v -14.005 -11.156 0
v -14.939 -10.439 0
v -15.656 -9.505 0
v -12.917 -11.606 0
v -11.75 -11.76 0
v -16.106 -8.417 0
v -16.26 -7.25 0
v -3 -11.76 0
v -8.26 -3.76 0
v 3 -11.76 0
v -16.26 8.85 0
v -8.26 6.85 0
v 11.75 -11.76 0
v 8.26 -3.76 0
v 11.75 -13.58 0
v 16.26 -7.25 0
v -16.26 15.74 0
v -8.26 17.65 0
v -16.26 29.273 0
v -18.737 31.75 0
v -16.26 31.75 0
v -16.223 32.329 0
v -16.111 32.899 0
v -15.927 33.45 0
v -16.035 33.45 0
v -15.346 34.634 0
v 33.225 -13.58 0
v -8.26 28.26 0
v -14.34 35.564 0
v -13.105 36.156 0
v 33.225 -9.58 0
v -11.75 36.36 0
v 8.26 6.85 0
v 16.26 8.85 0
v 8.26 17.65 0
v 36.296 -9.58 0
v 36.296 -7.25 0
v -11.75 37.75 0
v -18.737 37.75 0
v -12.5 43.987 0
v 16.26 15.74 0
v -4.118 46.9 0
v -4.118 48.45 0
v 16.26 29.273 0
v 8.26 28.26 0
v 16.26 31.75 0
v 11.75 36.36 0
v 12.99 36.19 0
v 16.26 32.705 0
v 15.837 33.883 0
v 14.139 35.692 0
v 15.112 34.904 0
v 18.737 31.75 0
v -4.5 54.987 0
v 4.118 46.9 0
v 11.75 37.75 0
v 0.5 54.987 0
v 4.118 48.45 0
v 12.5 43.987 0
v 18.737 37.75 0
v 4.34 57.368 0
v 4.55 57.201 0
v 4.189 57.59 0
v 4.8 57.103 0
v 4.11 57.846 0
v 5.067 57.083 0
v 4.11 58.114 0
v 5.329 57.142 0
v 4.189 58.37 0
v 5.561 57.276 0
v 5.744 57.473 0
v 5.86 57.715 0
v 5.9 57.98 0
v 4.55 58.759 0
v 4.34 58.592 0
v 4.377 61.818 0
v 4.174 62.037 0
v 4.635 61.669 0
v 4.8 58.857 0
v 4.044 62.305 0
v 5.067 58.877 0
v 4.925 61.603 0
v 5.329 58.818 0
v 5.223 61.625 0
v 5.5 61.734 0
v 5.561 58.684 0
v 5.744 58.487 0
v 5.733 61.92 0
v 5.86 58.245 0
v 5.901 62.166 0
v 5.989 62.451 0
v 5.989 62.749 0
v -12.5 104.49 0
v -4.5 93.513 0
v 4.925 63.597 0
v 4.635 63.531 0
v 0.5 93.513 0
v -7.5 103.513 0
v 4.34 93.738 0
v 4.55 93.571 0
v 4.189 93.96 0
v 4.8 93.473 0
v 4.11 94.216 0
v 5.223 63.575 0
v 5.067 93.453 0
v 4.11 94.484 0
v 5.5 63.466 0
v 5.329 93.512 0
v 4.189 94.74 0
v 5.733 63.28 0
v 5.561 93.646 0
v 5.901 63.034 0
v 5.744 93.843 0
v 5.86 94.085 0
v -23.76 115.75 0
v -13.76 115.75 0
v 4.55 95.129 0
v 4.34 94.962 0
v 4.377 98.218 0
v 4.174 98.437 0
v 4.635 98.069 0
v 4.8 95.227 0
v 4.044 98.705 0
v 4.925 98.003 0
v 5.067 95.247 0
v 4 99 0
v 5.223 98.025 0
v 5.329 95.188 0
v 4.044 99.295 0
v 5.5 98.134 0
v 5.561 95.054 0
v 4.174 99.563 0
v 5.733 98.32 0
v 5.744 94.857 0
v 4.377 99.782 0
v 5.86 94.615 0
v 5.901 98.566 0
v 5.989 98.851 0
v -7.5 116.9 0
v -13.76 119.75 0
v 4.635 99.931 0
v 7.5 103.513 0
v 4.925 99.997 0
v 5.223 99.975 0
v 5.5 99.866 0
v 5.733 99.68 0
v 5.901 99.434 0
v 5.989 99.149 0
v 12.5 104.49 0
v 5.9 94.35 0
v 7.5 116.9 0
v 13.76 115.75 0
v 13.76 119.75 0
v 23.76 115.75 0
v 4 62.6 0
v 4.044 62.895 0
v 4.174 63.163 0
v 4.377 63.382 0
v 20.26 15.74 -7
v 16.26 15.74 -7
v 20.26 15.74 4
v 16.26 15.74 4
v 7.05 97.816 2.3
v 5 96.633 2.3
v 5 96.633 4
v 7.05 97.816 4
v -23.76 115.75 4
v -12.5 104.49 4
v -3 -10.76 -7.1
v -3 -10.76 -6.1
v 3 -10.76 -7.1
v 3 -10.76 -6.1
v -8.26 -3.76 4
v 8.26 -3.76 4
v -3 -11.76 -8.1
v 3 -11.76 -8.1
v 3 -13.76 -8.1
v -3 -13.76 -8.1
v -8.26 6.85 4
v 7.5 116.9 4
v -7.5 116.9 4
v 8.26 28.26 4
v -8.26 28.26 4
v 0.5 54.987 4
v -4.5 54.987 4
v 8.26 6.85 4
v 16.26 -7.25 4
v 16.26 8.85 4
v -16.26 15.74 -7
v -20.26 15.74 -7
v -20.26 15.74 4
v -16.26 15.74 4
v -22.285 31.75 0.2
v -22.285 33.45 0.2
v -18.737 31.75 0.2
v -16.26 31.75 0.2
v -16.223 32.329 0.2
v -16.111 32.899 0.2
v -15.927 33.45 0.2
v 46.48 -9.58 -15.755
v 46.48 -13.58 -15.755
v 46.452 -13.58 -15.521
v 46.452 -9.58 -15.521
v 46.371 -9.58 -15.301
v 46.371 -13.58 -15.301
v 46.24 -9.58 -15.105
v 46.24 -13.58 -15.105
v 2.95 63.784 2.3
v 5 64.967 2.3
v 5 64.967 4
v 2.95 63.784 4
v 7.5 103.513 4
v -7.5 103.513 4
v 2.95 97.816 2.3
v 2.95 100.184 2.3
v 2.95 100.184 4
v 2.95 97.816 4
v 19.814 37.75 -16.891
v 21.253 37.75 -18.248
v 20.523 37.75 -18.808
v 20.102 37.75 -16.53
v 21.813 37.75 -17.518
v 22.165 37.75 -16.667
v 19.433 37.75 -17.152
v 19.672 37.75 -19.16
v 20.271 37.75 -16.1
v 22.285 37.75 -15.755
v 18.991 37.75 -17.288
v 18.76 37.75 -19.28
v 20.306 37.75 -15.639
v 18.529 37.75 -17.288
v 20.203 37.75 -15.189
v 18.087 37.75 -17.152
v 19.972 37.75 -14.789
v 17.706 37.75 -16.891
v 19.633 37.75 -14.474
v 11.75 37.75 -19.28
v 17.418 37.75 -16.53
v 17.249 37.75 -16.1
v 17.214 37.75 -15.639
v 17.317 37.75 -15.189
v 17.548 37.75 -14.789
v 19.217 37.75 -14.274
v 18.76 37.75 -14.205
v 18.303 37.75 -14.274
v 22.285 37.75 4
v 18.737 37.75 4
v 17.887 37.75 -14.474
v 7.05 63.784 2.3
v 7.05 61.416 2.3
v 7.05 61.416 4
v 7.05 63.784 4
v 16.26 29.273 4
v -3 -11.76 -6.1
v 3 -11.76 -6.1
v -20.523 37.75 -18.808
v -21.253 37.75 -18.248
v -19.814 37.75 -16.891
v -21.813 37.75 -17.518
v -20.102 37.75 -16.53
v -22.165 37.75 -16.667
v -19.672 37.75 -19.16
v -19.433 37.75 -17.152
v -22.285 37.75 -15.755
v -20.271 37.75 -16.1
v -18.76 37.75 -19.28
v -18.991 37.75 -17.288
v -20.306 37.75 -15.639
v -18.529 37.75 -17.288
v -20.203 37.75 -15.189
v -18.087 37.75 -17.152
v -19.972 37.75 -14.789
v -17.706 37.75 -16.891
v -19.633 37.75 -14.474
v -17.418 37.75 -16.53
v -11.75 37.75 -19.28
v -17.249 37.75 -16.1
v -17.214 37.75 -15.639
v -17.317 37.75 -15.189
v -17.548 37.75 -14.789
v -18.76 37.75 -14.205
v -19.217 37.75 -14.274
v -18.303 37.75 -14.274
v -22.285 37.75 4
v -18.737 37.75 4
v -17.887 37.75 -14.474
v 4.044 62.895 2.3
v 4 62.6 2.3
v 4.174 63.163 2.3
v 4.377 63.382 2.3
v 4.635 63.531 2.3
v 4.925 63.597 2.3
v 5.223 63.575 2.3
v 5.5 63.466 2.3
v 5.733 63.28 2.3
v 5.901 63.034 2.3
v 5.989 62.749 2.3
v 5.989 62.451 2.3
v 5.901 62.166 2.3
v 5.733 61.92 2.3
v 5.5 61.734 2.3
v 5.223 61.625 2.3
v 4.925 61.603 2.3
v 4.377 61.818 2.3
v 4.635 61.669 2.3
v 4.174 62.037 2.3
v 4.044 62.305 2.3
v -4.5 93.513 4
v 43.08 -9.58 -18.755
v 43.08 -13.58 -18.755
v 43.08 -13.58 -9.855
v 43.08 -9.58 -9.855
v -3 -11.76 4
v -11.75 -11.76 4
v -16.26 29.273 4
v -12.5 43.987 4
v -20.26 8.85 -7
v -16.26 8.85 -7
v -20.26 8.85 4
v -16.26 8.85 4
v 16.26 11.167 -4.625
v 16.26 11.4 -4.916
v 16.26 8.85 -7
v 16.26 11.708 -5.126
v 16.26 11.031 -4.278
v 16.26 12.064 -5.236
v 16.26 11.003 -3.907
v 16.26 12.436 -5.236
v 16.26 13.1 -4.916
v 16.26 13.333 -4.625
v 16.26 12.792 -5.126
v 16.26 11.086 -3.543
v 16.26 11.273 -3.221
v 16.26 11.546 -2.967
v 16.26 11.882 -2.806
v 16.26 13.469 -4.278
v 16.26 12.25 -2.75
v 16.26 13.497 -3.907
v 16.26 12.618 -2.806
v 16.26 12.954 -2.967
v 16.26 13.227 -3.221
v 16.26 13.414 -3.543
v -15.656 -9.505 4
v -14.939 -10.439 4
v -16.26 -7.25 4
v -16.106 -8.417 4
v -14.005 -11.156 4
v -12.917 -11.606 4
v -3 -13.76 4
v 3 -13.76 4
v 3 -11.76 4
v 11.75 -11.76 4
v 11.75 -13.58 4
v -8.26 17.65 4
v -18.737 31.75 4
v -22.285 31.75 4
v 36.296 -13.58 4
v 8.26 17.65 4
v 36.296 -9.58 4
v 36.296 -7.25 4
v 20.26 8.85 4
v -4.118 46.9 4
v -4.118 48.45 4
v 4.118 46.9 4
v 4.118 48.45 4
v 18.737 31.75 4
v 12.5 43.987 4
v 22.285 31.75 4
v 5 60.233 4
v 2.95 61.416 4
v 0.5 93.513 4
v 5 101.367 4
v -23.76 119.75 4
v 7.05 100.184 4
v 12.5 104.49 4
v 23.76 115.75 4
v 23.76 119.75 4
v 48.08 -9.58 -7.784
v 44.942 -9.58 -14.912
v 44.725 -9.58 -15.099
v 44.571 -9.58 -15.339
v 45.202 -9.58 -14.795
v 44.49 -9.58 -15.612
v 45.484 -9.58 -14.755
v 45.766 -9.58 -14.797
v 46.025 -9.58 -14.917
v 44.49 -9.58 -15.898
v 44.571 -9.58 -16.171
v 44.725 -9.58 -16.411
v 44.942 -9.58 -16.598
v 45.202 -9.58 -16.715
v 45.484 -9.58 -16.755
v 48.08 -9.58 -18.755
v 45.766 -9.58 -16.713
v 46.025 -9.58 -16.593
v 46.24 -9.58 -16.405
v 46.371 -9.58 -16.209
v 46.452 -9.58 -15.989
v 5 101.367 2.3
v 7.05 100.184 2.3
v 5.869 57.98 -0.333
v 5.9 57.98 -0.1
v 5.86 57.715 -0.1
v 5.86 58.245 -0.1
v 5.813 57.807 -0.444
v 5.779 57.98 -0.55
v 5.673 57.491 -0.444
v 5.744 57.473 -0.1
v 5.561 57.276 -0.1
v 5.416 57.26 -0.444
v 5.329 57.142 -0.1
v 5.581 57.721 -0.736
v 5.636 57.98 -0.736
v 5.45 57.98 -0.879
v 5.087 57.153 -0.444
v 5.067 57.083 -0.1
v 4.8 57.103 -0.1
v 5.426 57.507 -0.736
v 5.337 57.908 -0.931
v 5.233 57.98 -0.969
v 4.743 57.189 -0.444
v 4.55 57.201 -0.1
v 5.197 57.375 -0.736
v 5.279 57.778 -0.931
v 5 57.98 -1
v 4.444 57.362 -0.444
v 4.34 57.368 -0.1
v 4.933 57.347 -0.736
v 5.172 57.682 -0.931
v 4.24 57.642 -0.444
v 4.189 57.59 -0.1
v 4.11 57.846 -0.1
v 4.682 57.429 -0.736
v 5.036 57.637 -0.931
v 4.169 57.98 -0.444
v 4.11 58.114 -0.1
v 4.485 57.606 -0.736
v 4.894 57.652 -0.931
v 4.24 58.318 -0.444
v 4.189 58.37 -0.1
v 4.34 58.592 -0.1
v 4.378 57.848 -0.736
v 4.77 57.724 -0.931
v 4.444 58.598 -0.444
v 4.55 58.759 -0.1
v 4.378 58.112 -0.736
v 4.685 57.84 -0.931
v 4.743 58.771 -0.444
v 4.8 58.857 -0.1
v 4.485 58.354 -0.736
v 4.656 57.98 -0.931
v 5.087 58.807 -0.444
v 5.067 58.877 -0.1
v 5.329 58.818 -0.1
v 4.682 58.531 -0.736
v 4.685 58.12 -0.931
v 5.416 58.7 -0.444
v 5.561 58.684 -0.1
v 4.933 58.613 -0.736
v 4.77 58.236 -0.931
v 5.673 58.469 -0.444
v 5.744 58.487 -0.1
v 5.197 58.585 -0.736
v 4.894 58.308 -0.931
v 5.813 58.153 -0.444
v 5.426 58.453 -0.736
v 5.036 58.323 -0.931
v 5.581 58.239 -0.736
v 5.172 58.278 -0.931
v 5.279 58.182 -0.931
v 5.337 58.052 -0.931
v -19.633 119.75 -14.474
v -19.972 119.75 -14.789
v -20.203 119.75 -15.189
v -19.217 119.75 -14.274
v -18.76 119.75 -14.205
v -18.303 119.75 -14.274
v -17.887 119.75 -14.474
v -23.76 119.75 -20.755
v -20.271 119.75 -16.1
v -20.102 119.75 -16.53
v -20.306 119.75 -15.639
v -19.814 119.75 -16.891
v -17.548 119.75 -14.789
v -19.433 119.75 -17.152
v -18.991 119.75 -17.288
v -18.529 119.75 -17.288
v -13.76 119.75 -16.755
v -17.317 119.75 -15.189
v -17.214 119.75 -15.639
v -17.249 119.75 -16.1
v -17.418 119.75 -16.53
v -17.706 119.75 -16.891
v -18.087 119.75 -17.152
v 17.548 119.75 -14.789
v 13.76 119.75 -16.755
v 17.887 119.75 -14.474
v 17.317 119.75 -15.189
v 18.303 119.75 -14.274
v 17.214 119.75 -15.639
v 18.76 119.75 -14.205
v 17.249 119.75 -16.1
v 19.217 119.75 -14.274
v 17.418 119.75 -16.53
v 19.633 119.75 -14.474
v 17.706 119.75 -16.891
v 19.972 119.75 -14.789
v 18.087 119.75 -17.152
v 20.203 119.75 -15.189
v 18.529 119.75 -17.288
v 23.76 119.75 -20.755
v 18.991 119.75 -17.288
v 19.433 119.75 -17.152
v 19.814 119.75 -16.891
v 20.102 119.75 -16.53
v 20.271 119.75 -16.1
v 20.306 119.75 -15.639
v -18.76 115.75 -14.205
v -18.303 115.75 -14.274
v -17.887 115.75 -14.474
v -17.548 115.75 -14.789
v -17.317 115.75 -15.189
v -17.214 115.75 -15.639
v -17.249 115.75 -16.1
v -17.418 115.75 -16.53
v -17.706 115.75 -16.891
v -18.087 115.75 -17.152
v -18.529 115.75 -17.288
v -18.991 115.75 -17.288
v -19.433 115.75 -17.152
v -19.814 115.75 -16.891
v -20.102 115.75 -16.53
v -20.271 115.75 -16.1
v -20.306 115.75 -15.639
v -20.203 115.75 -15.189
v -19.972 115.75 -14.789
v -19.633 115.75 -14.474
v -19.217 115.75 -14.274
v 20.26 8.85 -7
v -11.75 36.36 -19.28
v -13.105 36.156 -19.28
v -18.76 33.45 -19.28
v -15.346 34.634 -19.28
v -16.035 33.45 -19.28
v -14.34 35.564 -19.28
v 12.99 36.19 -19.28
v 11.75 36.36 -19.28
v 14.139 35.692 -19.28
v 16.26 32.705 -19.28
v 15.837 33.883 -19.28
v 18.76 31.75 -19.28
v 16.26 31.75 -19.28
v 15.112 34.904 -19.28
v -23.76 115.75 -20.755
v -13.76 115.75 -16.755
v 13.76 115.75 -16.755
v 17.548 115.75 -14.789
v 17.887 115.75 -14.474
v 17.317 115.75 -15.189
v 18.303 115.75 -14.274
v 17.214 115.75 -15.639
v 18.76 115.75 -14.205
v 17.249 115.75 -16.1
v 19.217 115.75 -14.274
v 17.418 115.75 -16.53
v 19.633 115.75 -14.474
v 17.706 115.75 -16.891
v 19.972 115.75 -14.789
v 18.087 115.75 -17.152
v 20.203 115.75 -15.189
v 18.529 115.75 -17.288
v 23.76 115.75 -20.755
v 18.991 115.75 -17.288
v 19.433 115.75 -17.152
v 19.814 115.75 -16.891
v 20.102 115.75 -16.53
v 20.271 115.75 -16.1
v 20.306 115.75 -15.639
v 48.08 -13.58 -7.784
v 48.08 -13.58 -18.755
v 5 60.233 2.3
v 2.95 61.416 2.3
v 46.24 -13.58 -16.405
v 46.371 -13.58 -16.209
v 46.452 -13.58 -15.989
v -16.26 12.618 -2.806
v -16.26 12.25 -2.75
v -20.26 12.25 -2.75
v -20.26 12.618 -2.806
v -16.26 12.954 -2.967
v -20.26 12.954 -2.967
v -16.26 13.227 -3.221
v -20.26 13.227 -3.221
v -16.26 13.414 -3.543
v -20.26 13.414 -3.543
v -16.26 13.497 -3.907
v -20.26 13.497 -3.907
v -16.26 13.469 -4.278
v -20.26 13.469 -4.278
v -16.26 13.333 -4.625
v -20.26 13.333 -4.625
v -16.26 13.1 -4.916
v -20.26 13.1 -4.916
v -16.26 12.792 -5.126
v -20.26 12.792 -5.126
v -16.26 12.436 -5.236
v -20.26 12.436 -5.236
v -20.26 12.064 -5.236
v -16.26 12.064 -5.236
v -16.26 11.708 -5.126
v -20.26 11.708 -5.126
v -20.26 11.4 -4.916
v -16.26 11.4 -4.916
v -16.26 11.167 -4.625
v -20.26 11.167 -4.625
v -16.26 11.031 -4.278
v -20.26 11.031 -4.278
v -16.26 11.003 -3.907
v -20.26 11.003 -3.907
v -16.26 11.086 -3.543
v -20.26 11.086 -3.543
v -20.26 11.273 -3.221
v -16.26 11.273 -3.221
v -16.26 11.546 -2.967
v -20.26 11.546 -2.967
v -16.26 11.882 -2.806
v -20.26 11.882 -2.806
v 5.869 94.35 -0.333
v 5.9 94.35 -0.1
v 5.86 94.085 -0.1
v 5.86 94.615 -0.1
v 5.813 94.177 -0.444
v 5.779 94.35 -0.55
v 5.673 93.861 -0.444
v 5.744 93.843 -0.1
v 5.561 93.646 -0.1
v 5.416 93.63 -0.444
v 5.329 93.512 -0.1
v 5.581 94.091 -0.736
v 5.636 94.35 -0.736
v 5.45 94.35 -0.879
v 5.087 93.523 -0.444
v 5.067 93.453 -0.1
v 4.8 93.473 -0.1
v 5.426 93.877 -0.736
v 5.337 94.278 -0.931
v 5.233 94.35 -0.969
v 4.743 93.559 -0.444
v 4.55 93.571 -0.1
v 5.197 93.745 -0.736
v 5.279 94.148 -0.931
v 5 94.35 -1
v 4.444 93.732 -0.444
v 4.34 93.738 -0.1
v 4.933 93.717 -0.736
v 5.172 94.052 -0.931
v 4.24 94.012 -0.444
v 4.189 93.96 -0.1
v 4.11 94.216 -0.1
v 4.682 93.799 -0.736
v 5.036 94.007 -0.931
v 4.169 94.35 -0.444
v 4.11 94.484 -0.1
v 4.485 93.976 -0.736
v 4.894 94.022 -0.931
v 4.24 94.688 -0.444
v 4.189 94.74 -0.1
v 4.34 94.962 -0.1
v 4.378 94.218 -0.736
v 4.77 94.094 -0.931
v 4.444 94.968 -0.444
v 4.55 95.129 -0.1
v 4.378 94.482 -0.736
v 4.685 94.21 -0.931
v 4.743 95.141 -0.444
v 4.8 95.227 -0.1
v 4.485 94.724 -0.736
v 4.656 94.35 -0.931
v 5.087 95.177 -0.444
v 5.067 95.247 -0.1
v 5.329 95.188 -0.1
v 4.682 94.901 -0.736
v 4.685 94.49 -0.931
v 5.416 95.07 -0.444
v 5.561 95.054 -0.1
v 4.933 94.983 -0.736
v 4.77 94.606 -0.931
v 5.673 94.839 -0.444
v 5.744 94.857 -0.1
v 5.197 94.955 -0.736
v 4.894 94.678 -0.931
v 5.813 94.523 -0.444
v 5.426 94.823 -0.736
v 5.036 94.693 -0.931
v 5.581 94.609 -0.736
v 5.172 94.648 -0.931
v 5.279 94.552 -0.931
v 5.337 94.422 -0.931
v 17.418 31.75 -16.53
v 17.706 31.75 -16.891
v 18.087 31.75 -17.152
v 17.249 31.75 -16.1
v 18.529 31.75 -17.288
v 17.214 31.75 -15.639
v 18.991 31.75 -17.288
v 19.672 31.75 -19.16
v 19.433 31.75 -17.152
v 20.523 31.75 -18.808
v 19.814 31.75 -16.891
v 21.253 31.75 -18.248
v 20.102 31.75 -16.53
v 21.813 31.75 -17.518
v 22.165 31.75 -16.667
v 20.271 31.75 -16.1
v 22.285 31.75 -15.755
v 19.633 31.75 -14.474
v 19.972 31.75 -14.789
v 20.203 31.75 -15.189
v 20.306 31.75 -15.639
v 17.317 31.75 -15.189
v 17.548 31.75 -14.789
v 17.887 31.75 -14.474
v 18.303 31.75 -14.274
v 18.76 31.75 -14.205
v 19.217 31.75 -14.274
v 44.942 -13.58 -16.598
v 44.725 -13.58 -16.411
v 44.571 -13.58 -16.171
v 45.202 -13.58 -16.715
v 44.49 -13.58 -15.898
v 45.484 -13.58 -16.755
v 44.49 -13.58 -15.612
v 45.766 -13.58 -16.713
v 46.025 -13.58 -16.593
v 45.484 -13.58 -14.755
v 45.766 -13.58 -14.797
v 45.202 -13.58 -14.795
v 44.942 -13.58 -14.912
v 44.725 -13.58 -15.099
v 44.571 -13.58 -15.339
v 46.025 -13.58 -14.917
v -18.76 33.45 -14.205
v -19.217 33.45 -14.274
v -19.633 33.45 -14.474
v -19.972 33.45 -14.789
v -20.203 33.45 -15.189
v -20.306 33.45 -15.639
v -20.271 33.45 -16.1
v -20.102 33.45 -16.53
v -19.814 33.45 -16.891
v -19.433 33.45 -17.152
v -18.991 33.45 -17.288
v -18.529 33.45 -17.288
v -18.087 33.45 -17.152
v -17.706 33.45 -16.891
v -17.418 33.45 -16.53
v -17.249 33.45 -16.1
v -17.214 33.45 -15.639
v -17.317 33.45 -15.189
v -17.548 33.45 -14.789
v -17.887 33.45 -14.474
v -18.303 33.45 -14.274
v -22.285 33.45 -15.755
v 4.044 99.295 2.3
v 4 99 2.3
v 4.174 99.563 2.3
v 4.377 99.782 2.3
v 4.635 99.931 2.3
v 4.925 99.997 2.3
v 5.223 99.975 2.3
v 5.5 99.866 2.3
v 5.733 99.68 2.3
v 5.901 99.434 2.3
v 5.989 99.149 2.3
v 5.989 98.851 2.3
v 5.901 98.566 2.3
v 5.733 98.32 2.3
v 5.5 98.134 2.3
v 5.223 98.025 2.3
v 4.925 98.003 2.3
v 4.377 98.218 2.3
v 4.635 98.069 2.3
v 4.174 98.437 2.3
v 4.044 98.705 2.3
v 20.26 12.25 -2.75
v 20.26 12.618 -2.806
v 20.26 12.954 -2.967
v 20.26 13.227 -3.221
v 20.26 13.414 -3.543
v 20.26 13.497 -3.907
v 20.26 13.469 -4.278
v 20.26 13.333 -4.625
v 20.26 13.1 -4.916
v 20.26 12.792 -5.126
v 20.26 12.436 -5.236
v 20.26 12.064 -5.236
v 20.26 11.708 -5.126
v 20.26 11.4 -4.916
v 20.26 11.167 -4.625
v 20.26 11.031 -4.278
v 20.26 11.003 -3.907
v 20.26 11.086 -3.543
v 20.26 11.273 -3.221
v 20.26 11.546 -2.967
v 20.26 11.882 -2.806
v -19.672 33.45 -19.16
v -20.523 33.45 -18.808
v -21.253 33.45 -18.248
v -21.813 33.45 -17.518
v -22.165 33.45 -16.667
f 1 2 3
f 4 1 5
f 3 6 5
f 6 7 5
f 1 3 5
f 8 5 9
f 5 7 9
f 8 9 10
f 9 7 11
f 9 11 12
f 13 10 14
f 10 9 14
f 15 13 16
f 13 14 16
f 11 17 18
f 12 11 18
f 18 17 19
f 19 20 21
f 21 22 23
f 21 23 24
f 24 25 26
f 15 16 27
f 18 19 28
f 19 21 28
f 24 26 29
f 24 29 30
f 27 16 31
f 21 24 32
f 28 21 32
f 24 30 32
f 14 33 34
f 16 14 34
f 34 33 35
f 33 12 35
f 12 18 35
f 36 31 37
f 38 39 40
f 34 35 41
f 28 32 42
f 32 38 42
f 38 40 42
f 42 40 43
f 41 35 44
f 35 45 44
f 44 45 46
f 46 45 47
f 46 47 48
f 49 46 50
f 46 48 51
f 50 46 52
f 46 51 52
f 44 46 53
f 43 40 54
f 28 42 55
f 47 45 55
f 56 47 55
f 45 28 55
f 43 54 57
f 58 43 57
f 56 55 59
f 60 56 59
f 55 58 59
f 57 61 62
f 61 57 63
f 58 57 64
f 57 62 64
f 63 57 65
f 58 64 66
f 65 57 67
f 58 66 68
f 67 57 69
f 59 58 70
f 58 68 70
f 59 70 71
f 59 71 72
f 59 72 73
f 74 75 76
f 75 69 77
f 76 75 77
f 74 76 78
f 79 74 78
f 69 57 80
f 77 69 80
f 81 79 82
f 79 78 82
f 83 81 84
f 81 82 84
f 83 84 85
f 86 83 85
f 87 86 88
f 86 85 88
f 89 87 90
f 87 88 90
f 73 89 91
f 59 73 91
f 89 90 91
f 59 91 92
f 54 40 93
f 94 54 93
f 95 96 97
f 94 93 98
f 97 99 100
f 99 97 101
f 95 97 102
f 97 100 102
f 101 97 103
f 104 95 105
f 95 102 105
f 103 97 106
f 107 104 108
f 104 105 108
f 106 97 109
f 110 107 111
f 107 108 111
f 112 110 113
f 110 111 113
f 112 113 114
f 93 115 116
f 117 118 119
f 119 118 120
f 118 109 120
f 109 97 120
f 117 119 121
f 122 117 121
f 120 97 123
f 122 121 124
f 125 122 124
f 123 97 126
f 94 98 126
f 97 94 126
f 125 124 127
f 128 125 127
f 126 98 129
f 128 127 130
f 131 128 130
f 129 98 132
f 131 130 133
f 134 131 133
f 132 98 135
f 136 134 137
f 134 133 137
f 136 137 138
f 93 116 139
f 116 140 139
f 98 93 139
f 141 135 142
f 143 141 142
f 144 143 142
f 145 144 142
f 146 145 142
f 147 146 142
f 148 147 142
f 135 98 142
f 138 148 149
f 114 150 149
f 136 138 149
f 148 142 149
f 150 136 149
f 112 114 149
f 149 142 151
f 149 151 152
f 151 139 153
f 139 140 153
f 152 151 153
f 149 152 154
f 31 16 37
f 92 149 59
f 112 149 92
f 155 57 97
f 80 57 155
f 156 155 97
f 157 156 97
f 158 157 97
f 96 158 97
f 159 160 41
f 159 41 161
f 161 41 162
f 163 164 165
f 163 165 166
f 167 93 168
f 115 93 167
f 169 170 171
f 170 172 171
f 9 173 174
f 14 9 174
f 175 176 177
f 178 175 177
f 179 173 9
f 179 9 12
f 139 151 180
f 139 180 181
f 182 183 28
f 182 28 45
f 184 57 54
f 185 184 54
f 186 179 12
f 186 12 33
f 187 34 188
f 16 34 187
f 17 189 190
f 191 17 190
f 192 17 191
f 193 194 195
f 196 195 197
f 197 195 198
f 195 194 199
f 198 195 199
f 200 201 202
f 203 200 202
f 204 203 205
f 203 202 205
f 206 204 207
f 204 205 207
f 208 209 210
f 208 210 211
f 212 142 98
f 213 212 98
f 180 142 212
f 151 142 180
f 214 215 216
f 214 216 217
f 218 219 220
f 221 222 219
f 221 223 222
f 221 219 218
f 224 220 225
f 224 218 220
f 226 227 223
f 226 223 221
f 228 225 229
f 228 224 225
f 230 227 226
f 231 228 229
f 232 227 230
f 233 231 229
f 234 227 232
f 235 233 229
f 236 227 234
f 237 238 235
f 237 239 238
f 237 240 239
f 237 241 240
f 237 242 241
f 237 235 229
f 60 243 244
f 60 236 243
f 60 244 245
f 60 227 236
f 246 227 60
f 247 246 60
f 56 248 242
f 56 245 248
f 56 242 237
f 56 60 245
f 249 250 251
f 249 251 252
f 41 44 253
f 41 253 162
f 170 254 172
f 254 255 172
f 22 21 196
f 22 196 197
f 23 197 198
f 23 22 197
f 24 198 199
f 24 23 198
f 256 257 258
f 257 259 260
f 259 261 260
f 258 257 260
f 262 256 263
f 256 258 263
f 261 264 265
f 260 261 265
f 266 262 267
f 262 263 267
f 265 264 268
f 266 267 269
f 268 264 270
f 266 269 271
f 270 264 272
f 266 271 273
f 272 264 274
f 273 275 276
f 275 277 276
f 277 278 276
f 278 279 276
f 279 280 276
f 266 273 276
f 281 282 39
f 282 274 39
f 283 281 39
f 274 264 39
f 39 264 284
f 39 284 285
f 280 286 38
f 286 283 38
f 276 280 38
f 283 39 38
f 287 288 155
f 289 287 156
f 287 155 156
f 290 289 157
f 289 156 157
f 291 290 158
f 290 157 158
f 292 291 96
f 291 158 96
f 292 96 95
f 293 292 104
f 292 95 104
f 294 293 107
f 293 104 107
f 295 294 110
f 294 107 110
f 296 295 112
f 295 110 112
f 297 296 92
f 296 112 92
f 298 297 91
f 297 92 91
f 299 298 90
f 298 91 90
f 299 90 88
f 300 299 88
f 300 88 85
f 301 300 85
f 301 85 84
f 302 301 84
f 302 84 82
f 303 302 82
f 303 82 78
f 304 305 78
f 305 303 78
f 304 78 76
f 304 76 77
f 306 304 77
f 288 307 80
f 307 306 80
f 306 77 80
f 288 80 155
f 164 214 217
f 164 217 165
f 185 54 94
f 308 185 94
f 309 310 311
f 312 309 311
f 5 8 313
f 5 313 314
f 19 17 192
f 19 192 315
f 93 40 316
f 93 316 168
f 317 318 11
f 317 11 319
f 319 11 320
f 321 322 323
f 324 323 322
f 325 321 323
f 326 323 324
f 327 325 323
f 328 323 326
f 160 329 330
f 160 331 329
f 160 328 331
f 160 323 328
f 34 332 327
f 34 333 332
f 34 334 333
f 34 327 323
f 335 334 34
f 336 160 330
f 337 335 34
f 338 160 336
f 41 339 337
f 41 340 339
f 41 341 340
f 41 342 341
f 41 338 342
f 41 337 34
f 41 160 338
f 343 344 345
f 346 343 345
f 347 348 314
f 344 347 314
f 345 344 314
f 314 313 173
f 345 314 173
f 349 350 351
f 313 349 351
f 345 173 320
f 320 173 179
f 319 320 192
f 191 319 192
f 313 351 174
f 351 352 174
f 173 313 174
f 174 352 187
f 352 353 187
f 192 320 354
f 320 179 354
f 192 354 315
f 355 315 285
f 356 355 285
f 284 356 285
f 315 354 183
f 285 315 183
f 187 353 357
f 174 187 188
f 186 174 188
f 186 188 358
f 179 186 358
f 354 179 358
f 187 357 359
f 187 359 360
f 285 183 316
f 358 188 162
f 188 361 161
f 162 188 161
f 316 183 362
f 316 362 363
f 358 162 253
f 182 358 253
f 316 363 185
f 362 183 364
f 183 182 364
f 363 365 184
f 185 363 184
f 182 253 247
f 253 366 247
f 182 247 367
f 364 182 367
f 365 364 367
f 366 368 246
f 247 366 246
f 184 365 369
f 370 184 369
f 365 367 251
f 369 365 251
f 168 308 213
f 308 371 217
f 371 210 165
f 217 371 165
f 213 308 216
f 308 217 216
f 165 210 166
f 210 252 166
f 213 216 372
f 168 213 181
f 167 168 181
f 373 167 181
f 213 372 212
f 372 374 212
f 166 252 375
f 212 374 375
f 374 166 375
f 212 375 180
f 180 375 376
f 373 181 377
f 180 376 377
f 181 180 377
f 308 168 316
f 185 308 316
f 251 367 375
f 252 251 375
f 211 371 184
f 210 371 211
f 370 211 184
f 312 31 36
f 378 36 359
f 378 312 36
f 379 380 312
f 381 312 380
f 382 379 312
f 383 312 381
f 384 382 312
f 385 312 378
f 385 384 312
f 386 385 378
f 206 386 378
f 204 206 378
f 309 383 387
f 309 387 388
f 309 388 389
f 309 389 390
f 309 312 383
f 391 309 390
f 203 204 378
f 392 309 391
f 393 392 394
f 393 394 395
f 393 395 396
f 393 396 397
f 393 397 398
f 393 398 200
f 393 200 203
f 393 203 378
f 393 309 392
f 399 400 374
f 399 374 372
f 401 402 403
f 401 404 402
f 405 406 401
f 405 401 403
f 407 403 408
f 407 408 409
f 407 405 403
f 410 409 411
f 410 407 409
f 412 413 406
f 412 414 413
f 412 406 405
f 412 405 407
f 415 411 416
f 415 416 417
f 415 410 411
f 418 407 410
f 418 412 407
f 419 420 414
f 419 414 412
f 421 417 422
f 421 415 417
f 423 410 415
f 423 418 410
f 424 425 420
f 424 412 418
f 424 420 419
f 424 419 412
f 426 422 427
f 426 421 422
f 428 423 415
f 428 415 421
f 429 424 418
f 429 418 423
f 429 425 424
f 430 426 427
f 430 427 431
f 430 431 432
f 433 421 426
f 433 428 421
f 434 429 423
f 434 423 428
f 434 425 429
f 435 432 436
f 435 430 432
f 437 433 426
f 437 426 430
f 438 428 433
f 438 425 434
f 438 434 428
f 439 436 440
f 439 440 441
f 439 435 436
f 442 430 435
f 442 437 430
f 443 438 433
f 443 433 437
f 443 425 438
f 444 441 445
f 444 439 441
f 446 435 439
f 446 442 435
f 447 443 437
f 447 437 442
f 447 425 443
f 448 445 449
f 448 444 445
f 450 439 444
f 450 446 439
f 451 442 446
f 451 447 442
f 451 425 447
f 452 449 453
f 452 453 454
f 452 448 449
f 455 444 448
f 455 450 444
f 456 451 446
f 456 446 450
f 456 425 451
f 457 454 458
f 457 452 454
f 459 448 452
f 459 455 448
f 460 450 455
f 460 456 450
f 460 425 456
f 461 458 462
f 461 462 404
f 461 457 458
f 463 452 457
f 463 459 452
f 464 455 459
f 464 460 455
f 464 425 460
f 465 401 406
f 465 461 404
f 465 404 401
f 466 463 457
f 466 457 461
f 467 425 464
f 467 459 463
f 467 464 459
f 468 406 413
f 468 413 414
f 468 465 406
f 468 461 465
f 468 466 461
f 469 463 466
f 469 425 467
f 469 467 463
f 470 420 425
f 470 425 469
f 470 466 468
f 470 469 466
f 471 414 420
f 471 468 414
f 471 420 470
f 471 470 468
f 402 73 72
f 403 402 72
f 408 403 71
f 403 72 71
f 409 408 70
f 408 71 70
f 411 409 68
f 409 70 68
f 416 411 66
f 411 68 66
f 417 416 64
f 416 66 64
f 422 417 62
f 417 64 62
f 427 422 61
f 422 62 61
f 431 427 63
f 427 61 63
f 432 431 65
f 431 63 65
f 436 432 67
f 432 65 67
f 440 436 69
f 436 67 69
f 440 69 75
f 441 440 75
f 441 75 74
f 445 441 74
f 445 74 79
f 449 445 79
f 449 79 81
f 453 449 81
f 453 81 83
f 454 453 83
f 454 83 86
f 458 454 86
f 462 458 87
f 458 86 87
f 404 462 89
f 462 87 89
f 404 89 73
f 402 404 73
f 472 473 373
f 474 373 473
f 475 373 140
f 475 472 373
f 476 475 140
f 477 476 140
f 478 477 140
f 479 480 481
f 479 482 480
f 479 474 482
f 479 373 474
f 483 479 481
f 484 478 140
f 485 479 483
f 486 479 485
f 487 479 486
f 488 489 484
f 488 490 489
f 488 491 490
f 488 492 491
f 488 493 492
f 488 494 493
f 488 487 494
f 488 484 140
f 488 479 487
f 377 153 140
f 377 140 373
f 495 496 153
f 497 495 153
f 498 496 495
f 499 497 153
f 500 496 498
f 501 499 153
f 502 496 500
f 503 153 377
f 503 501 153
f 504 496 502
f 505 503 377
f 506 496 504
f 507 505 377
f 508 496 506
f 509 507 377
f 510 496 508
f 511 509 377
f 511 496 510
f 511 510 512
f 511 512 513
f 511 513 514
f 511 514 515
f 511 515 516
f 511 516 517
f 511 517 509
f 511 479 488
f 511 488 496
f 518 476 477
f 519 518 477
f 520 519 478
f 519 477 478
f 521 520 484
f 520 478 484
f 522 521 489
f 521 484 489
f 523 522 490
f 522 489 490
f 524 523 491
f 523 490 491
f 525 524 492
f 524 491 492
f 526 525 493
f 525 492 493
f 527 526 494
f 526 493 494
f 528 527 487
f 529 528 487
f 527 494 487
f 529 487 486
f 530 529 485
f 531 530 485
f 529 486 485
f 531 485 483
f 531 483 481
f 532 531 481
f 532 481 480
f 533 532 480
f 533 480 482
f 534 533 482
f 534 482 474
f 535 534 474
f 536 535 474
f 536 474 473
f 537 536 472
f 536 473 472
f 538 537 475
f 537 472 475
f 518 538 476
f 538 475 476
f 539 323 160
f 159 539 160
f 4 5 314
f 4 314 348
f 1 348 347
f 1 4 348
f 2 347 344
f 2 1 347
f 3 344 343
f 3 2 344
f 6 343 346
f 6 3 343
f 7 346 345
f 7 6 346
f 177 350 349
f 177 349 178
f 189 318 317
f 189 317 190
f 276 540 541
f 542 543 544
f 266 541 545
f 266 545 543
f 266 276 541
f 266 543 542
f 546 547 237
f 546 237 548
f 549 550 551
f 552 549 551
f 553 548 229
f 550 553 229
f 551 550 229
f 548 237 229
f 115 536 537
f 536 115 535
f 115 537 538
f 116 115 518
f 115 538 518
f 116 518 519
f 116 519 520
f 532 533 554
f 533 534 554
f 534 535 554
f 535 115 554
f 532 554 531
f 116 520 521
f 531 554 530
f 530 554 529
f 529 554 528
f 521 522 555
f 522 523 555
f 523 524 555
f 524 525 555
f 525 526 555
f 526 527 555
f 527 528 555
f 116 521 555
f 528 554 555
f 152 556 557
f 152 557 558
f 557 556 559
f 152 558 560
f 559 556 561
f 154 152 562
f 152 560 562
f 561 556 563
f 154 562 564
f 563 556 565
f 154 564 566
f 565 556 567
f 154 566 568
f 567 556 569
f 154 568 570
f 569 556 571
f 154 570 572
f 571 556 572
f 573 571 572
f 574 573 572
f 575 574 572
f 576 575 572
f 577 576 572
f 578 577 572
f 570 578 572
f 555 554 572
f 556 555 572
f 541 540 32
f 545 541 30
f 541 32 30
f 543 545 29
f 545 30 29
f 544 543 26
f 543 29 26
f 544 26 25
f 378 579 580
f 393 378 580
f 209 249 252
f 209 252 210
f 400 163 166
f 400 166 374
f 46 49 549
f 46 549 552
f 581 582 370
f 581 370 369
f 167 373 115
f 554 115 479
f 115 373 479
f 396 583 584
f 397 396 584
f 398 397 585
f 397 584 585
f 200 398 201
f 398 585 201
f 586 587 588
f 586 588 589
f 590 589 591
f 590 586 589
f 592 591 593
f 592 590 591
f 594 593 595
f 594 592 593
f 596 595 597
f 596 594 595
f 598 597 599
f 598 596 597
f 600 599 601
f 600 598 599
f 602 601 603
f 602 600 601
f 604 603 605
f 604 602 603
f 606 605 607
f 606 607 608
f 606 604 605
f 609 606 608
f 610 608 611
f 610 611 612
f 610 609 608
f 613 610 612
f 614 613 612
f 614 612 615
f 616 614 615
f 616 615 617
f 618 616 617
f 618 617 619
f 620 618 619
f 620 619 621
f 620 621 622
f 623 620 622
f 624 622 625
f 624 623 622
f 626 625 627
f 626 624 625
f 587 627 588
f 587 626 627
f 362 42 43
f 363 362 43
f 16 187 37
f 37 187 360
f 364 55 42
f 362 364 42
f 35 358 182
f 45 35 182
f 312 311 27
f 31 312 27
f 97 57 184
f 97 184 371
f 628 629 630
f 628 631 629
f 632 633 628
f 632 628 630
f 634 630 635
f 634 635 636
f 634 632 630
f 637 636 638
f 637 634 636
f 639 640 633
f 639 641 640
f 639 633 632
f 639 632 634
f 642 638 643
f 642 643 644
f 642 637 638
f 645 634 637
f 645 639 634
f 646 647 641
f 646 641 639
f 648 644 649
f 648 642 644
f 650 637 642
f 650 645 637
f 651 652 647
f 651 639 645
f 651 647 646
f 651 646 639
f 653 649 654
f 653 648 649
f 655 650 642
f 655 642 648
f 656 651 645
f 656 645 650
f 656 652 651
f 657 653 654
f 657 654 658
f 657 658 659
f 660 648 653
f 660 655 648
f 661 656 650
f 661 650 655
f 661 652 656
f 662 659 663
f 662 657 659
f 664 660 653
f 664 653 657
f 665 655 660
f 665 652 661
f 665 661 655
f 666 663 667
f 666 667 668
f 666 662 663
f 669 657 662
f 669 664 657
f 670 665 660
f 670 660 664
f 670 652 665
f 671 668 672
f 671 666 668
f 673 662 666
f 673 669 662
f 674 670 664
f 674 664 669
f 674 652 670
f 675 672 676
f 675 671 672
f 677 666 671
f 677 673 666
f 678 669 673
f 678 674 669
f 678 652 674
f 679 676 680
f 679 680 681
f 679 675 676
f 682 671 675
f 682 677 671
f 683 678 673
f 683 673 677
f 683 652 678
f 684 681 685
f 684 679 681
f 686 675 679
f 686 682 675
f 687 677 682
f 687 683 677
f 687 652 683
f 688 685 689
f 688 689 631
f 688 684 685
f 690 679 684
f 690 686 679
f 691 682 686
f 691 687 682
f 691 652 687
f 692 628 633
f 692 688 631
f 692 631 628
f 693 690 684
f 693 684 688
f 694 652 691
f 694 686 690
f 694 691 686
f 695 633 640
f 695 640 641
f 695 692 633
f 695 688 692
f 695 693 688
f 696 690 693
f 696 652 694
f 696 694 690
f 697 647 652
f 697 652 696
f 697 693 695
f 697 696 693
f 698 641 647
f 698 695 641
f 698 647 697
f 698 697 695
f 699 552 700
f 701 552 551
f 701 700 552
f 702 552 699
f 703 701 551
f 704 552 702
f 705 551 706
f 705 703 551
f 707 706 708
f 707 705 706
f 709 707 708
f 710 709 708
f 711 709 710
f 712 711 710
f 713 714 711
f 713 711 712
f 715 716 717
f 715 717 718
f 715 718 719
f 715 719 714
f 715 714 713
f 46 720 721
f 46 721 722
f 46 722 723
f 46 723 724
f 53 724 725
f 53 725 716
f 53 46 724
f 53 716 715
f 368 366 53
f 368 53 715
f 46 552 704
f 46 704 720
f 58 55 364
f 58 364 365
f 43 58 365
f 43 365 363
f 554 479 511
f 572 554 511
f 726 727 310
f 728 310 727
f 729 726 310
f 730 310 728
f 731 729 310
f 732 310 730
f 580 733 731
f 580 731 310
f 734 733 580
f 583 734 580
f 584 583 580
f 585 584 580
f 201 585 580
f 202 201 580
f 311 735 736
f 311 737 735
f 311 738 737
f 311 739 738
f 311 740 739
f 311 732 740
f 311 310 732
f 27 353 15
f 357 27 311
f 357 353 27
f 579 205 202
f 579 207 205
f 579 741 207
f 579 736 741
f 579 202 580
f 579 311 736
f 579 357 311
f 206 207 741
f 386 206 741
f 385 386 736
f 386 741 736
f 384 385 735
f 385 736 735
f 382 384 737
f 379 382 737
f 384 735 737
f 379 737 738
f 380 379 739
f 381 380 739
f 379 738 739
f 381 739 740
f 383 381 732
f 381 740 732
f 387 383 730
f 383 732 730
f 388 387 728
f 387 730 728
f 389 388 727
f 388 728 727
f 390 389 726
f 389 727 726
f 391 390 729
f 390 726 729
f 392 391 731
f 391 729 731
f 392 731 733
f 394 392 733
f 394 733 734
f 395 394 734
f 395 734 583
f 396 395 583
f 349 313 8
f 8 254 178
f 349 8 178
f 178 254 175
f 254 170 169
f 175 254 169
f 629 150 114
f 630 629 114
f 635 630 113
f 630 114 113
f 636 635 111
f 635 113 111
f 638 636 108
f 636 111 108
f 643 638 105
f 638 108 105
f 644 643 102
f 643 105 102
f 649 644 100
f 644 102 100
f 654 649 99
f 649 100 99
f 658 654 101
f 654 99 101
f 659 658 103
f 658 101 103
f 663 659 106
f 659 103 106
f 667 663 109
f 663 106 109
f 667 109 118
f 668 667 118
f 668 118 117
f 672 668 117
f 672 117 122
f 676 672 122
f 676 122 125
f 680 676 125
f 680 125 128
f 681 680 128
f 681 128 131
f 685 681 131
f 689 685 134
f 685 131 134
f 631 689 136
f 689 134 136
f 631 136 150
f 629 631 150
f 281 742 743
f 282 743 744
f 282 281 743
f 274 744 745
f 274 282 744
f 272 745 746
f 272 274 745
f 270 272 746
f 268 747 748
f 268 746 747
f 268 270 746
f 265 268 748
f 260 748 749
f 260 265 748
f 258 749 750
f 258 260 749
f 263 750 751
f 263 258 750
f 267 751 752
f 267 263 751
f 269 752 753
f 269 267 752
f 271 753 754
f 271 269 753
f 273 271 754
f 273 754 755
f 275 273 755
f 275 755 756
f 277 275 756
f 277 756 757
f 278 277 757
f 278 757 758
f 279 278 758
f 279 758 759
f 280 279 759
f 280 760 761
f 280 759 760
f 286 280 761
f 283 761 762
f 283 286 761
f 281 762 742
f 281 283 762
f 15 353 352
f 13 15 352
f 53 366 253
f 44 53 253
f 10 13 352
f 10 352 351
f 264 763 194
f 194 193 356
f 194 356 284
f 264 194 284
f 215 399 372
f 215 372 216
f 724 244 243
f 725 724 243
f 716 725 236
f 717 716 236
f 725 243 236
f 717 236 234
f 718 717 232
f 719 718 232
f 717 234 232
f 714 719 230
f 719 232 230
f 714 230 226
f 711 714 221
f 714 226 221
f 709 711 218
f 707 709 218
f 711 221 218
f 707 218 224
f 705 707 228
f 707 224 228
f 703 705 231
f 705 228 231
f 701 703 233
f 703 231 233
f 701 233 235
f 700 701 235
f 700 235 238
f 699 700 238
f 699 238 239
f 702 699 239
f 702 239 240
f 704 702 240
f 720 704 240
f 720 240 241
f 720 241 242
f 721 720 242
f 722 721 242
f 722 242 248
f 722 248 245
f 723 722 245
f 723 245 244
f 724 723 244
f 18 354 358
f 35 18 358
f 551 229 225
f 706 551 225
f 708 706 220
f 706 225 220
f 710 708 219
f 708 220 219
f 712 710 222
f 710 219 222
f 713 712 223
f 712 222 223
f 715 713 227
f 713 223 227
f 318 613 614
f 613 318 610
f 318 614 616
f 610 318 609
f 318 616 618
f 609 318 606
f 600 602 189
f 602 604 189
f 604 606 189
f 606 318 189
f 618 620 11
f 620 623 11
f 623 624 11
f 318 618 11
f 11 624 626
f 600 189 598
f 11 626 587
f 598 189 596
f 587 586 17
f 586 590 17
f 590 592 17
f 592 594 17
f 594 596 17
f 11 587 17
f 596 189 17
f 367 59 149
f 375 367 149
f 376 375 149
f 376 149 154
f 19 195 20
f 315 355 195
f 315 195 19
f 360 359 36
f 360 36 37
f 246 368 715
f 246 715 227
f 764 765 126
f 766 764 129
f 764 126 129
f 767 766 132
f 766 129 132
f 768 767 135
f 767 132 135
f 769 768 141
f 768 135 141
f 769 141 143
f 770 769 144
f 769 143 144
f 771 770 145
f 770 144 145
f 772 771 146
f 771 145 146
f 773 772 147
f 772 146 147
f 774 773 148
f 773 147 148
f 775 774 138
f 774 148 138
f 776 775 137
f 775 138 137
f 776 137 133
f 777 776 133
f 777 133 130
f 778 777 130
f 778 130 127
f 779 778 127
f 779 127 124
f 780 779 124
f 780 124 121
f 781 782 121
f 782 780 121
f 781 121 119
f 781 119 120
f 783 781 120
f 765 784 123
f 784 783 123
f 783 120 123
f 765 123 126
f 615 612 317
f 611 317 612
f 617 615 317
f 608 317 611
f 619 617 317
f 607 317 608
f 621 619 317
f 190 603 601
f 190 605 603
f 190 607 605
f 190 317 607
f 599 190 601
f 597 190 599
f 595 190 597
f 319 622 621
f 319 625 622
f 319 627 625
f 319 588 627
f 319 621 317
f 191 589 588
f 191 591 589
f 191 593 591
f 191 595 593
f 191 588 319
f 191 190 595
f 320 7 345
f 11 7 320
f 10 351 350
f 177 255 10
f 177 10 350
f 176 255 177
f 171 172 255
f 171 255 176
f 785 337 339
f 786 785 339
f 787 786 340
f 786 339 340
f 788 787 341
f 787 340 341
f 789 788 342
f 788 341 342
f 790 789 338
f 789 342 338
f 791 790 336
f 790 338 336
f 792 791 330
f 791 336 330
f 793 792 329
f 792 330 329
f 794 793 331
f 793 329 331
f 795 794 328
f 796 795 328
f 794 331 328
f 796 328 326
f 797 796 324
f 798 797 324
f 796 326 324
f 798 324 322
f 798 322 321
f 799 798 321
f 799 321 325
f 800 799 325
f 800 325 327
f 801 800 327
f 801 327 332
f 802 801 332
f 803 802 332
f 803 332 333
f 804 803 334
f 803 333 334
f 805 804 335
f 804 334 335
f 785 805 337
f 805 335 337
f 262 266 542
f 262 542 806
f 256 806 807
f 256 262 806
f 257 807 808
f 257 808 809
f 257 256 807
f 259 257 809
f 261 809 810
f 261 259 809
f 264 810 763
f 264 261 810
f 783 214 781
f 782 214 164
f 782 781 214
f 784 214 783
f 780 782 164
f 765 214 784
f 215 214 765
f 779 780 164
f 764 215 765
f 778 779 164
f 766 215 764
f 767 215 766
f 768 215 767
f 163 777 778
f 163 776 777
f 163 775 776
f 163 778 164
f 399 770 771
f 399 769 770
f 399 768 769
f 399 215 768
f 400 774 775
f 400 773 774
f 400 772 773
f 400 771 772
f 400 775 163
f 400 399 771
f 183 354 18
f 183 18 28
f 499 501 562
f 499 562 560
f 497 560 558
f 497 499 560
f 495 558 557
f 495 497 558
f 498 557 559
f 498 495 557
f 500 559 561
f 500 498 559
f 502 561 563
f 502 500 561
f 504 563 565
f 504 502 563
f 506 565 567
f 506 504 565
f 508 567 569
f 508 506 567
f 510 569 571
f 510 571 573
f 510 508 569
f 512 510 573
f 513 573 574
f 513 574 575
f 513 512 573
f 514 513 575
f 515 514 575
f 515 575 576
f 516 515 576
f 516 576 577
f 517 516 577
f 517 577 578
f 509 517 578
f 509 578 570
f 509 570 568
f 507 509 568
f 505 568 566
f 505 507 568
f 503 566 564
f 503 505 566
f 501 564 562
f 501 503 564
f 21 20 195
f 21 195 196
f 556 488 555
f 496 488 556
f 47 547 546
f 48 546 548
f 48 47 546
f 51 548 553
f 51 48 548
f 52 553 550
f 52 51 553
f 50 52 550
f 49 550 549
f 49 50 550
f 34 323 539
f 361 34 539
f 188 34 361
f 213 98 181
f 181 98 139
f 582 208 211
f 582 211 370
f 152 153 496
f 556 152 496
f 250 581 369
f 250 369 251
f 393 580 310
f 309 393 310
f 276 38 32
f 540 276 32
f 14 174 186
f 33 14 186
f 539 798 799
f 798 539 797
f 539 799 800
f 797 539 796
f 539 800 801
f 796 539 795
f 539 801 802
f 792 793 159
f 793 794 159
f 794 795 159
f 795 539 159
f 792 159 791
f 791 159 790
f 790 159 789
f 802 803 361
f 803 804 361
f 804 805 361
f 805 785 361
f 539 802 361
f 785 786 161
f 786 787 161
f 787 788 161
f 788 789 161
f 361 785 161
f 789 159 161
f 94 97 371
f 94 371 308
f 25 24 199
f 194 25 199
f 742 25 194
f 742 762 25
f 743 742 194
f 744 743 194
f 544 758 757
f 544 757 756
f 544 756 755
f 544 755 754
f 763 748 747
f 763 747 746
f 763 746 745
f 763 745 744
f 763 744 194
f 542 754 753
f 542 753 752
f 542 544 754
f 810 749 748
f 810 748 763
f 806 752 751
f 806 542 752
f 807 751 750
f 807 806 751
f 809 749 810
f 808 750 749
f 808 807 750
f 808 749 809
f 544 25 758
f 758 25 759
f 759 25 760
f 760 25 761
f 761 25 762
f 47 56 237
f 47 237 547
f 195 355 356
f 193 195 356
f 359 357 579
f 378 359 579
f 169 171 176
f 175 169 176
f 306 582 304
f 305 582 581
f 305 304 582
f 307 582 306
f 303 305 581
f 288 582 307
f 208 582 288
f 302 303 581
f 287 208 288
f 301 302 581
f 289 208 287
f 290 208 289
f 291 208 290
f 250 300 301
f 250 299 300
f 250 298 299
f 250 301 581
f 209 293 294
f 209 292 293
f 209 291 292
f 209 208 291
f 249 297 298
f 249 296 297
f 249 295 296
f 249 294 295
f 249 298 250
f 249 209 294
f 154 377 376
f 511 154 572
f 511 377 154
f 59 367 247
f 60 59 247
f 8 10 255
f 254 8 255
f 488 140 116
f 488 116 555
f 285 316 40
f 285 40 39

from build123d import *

# Parameters (mm, degrees)
EXTRUDE_1_DEPTH     = 4
SKETCH_2_W          = 15
SKETCH_2_H          = 13.3866
CUT_EXTRUDE_1_DEPTH = 121.91505324
SKETCH_3_W          = 10
SKETCH_3_H          = 10
SKETCH_3_R          = 1.55
SKETCH_3_H_2        = 14.755
EXTRUDE_2_DEPTH     = 4
EXTRUDE_3_DEPTH     = 4
EXTRUDE_4_DEPTH     = 4
SKETCH_7_W          = 27.52
SKETCH_7_H          = 4
EXTRUDE_5_DEPTH     = 4
SKETCH_8_W          = 24.546067812
SKETCH_8_H          = 6.33
EXTRUDE_6_DEPTH     = 4
SKETCH_11_W         = 16.52
SKETCH_11_H         = 10.61
CUT_EXTRUDE_2_DEPTH = 132.394668556
SKETCH_12_W         = 11
SKETCH_12_H         = 6.89
SKETCH_12_R         = 1.25
EXTRUDE_6711_DEPTH  = 4
SKETCH_14_R         = 1
CUT_EXTRUDE_3_DEPTH = 131.700110654
SKETCH_15_R         = 0.9
EXTRUDE_9_DEPTH     = 1
FILLET_1_R          = 0.9
CUT_EXTRUDE_START   = -1.7
SKETCH_16_R         = 1
CUT_EXTRUDE_4_DEPTH = 1.7
CUT_EXTRUDE_5_DEPTH = 131.700110654
SKETCH_19_W         = 5
SKETCH_19_H         = 38.5268
SKETCH_19_W_2       = 8.236887868
SKETCH_19_H_2       = 1.55
CUT_EXTRUDE_6_DEPTH = 131.700110654
EXTRUDE_12_DEPTH    = 23.28
CUT_EXTRUDE_7_REACH = 99.296
SKETCH_23_R         = 1.55
EXTRUDE_13_DEPTH    = 4
CUT_EXTRUDE_START_2 = -19.28
CUT_EXTRUDE_8_DEPTH = 19.48
SKETCH_26_W         = 10.1
SKETCH_26_H         = 2
EXTRUDE_14_DEPTH    = 3


# Read off the part's stored shape, not the designer's step: 切除-拉伸8
with BuildPart() as part:
    # 草图1 → 凸台-拉伸1 (new body)
    with BuildSketch(Plane.XY):
        with BuildLine():
            Line((-16.26, -7.25), (-16.26, 119.75))
            Line((-16.26, 119.75), (16.26, 119.75))
            Line((16.26, 119.75), (16.26, -7.25))
            ThreePointArc((16.26, -7.25), (14.939051583, -10.439051583), (11.75, -11.76))
            Line((11.75, -11.76), (-11.75, -11.76))
            ThreePointArc((-11.75, -11.76), (-14.939051583, -10.439051583), (-16.26, -7.25))
        make_face()
    extrude(amount=EXTRUDE_1_DEPTH)

    # 草图2 → 切除-拉伸1 (cut, through all)
    with BuildSketch(Plane(origin=(0, 0, 0), x_dir=(-1, 0, 0), z_dir=(0, 0, -1))):
        with Locations((0, 110.2067)):
            Rectangle(SKETCH_2_W, SKETCH_2_H)
    extrude(amount=-CUT_EXTRUDE_1_DEPTH, mode=Mode.SUBTRACT)

    # 草图3 → 凸台-拉伸2 (add)
    # profile 1 of 2: a face of its own
    with BuildSketch(Plane(origin=(0, 119.75, 0), x_dir=(1, 0, 0), z_dir=(0, 1, 0))):
        with Locations((-18.76, 15.755)):
            Rectangle(SKETCH_3_W, SKETCH_3_H)
        with Locations(Location((-18.76, 15.755, 0), (0, 0, 270))):
            Circle(SKETCH_3_R, mode=Mode.SUBTRACT)
    # profile 2 of 2: a face of its own
    with BuildSketch(Plane(origin=(0, 119.75, 0), x_dir=(1, 0, 0), z_dir=(0, 1, 0))):
        with Locations((-18.76, 3.3775)):
            Rectangle(SKETCH_3_W, SKETCH_3_H_2)
    extrude_2 = extrude(amount=-EXTRUDE_2_DEPTH)

    # 镜向1: 凸台-拉伸2 across plane
    add(extrude_2.mirror(Plane(origin=(0, 0, 0), x_dir=(0, 0, 1), z_dir=(1, 0, 0))))

    # 草图6 → 凸台-拉伸4 (add)
    with BuildSketch(Plane.XY.offset(4)):
        Polygon((-16.26, 115.75), (-23.76, 115.75), (-16.26, 108.25), align=None)
        Polygon((16.26, 115.75), (16.26, 108.25), (23.76, 115.75), align=None)
    extrude(amount=-EXTRUDE_4_DEPTH)

    # 草图7 → 凸台-拉伸5 (add)
    with BuildSketch(Plane(origin=(0, 119.75, 0), x_dir=(1, 0, 0), z_dir=(0, 1, 0))):
        with Locations((0, 18.755)):
            Rectangle(SKETCH_7_W, SKETCH_7_H)
    extrude(amount=-EXTRUDE_5_DEPTH)



with BuildPart() as body_2:
    # 草图5 → 凸台-拉伸3 (new body)
    with BuildSketch(Plane(origin=(0, -13.58, 0), x_dir=(1, 0, 0), z_dir=(0, 1, 0))):
        Polygon((47.78, 9.855), (43.08, 9.855), (29.225, -4), (36.296067812, -4), (48.08, 7.783932188), (48.08, 9.855), align=None)
        with BuildLine():
            Line((47.78, 18.755), (43.08, 18.755))
            Line((43.08, 18.755), (43.08, 9.855))
            Line((43.08, 9.855), (47.78, 9.855))
            Line((47.78, 9.855), (47.78, 15.105))
            Line((47.78, 15.105), (46.239934208, 15.105))
            ThreePointArc((46.239934208, 15.105), (44.48, 15.755), (46.239934208, 16.405))
            Line((46.239934208, 16.405), (47.78, 16.405))
            Line((47.78, 16.405), (47.78, 18.755))
        make_face()
        with BuildLine():
            Line((48.08, 18.755), (47.78, 18.755))
            Line((47.78, 18.755), (47.78, 16.405))
            Line((47.78, 16.405), (46.239934208, 16.405))
            ThreePointArc((46.239934208, 16.405), (46.418065618, 16.10145764), (46.48, 15.755))
            ThreePointArc((46.48, 15.755), (46.418065618, 15.40854236), (46.239934208, 15.105))
            Line((46.239934208, 15.105), (47.78, 15.105))
            Line((47.78, 15.105), (47.78, 9.855))
            Line((47.78, 9.855), (48.08, 9.855))
            Line((48.08, 9.855), (48.08, 18.755))
        make_face()
    extrude(amount=EXTRUDE_3_DEPTH)


with BuildPart() as part_1:
    add(part.part)

    add(body_2.part)  # 凸台-拉伸6 merges body 2
    # 草图8 → 凸台-拉伸6 (add)
    with BuildSketch(Plane.XY.offset(4)):
        with Locations((24.023033906, -10.415)):
            Rectangle(SKETCH_8_W, SKETCH_8_H)
    extrude(amount=-EXTRUDE_6_DEPTH)

    # 草图11 → 切除-拉伸2 (cut, through all)
    with BuildSketch(Plane.XY.offset(4)):
        with Locations((0, 1.545)):
            Rectangle(SKETCH_11_W, SKETCH_11_H)
        with Locations((0, 22.955)):
            Rectangle(SKETCH_11_W, SKETCH_11_H)
    extrude(amount=-CUT_EXTRUDE_2_DEPTH, mode=Mode.SUBTRACT)

    # 草图12 → Extrude 6711 (add)
    with BuildSketch(Plane.ZY.offset(16.26)):
        with Locations((-1.5, 12.295)):
            Rectangle(SKETCH_12_W, SKETCH_12_H)
        with Locations((-4, 12.25)):
            Circle(SKETCH_12_R, mode=Mode.SUBTRACT)
    extrude_6711 = extrude(amount=EXTRUDE_6711_DEPTH)

    # 镜向4: Extrude 6711 across plane
    add(extrude_6711.mirror(Plane(origin=(0, 0, 0), x_dir=(0, 0, 1), z_dir=(1, 0, 0))))

    # 草图14 → 切除-拉伸3 (cut, through all)
    with BuildSketch(Plane(origin=(0, 0, 0), x_dir=(-1, 0, 0), z_dir=(0, 0, -1))):
        with Locations((-5, 62.6)):
            Circle(SKETCH_14_R)
        with Locations((-5, 99)):
            Circle(SKETCH_14_R)
    extrude(amount=-CUT_EXTRUDE_3_DEPTH, mode=Mode.SUBTRACT)

    # 草图15 → 凸台-拉伸9 (add)
    with BuildSketch(Plane(origin=(0, 0, 0), x_dir=(-1, 0, 0), z_dir=(0, 0, -1))):
        with Locations(Location((-5, 94.35, 0), (0, 0, 180))):
            Circle(SKETCH_15_R)
        with Locations(Location((-5, 57.98, 0), (0, 0, 180))):
            Circle(SKETCH_15_R)
    extrude(amount=EXTRUDE_9_DEPTH)

    # 圆角1
    fillet_1_edges = [part_1.edges().sort_by_distance(p)[0] for p in [
        (4.1, 94.35, -1),
        (4.1, 57.98, -1),
    ]]
    fillet(fillet_1_edges, radius=FILLET_1_R)

    # 草图16 → 切除-拉伸4 (cut)
    # profile 1 of 2: a face of its own
    with BuildSketch(Plane.XY.offset(4).offset(CUT_EXTRUDE_START)):
        Polygon((7.05, 61.416431948), (7.05, 63.783568052), (5, 64.967136104), (2.95, 63.783568052), (2.95, 61.416431948), (5, 60.232863896), align=None)
        with Locations(Location((5, 62.6, 0), (0, 0, 180))):
            Circle(SKETCH_16_R, mode=Mode.SUBTRACT)
    # profile 2 of 2: a face of its own
    with BuildSketch(Plane.XY.offset(4).offset(CUT_EXTRUDE_START)):
        Polygon((2.95, 97.816431948), (5, 96.632863896), (7.05, 97.816431948), (7.05, 100.183568052), (5, 101.367136104), (2.95, 100.183568052), align=None)
        with Locations(Location((5, 99, 0), (0, 0, 180))):
            Circle(SKETCH_16_R, mode=Mode.SUBTRACT)
    extrude(amount=CUT_EXTRUDE_4_DEPTH, mode=Mode.SUBTRACT)

    # 草图17 → 切除-拉伸5 (cut, symmetric)
    with BuildSketch(Plane(origin=(0, 0, 0), x_dir=(-1, 0, 0), z_dir=(0, 0, -1))):
        Polygon((-12.5, 104.49), (-16.26, 108.25), (-16.26, 40.2266), (-12.5, 43.9866), align=None)
    cut_extrude_5 = extrude(amount=CUT_EXTRUDE_5_DEPTH, both=True, mode=Mode.SUBTRACT)

    # 镜向2: 切除-拉伸5 across plane
    add(cut_extrude_5.mirror(Plane(origin=(0, 0, 0), x_dir=(0, 0, 1), z_dir=(1, 0, 0))), mode=Mode.SUBTRACT)

    # 草图19 → 切除-拉伸6 (cut, through all)
    with BuildSketch(Plane(origin=(0, 0, 0), x_dir=(-1, 0, 0), z_dir=(0, 0, -1))):
        with Locations((2, 74.25)):
            Rectangle(SKETCH_19_W, SKETCH_19_H)
        with Locations((0, 47.675)):
            Rectangle(SKETCH_19_W_2, SKETCH_19_H_2)
    extrude(amount=-CUT_EXTRUDE_6_DEPTH, mode=Mode.SUBTRACT)

    # 草图22 → 凸台-拉伸12 (add)
    with BuildSketch(Plane.XY.offset(4)):
        with BuildLine():
            Line((16.26, 32.704986911), (16.26, 31.75))
            Line((16.26, 31.75), (22.285, 31.75))
            Line((22.285, 31.75), (22.285, 37.75))
            Line((22.285, 37.75), (11.75, 37.75))
            Line((11.75, 37.75), (11.75, 36.36))
            ThreePointArc((11.75, 36.36), (14.652551493, 35.331521301), (16.26, 32.704986911))
        make_face()
    extrude_12 = extrude(amount=-EXTRUDE_12_DEPTH)

    # 草图23 → 切除-拉伸7 (cut, up to next)
    with BuildSketch(Plane(origin=(0, 37.75, 0), x_dir=(1, 0, 0), z_dir=(0, 1, 0)), mode=Mode.PRIVATE) as cut_extrude_7_sk1:
        with Locations(Location((18.76, 15.755, 0), (0, 0, 270))):
            Circle(SKETCH_23_R)
    cut_extrude_7_tool1 = extrude(cut_extrude_7_sk1.sketch, amount=-CUT_EXTRUDE_7_REACH, mode=Mode.PRIVATE) & part_1.part
    # 草图23 → 切除-拉伸7 (cut, up to next)
    with BuildSketch(Plane(origin=(0, 37.75, 0), x_dir=(1, 0, 0), z_dir=(0, 1, 0)), mode=Mode.PRIVATE) as cut_extrude_7_sk2:
        with BuildLine():
            ThreePointArc((18.76, 19.28), (21.252551404, 18.247551404), (22.285, 15.755))
            Line((22.285, 15.755), (22.285, 19.28))
            Line((22.285, 19.28), (18.76, 19.28))
        make_face()
    cut_extrude_7_tool2 = extrude(cut_extrude_7_sk2.sketch, amount=-CUT_EXTRUDE_7_REACH, mode=Mode.PRIVATE) & part_1.part
    cut_extrude_7_1 = cut_extrude_7_tool1.solids().sort_by_distance((18.76, 37.75, -15.755))[0]
    add(cut_extrude_7_1, mode=Mode.SUBTRACT)
    cut_extrude_7_2 = cut_extrude_7_tool2.solids().sort_by_distance((21.497628, 37.75, -18.492628))[0]
    add(cut_extrude_7_2, mode=Mode.SUBTRACT)
    cut_extrude_7 = cut_extrude_7_1 + cut_extrude_7_2  # 切除-拉伸7 as one shape, for the pattern or mirror that repeats it

    # 草图24 → 凸台-拉伸13 (add)
    with BuildSketch(Plane.XY.offset(4)):
        Polygon((16.26, 40.2266), (18.7366, 37.75), (18.7366, 31.75), (16.26, 29.2734), align=None)
    extrude_13 = extrude(amount=-EXTRUDE_13_DEPTH)

    # 镜向3: 凸台-拉伸12, 切除-拉伸7, 凸台-拉伸13 across plane
    add(extrude_12.mirror(Plane(origin=(0, 0, 0), x_dir=(0, 0, 1), z_dir=(1, 0, 0))))
    add(cut_extrude_7.mirror(Plane(origin=(0, 0, 0), x_dir=(0, 0, 1), z_dir=(1, 0, 0))), mode=Mode.SUBTRACT)
    add(extrude_13.mirror(Plane(origin=(0, 0, 0), x_dir=(0, 0, 1), z_dir=(1, 0, 0))))

    # 切除-拉伸8 outline → 切除-拉伸8 (cut)
    with BuildSketch(Plane.XY.offset(CUT_EXTRUDE_START_2)):
        with BuildLine():
            ThreePointArc((-16.26, 31.75), (-16.176051621, 32.616121846), (-15.927331684, 33.45))
            Line((-15.927331684, 33.45), (-22.285, 33.45))
            Line((-22.285, 33.45), (-22.285, 31.75))
            Line((-22.285, 31.75), (-16.26, 31.75))
        make_face()
    extrude(amount=CUT_EXTRUDE_8_DEPTH, mode=Mode.SUBTRACT)

    # 草图26 → 凸台-拉伸14 (add, symmetric)
    with BuildSketch(Plane(origin=(0, 0, 0), x_dir=(0, 0, -1), z_dir=(1, 0, 0))):
        with Locations((1.05, -12.76)):
            Rectangle(SKETCH_26_W, SKETCH_26_H)
        Polygon((8.1, -11.76), (8.1, -13.76), (6.1, -13.76), (6.1, -11.76), (6.1, -10.76), (7.1, -10.76), align=None)
    extrude(amount=EXTRUDE_14_DEPTH, both=True)


solid = part_1.part
